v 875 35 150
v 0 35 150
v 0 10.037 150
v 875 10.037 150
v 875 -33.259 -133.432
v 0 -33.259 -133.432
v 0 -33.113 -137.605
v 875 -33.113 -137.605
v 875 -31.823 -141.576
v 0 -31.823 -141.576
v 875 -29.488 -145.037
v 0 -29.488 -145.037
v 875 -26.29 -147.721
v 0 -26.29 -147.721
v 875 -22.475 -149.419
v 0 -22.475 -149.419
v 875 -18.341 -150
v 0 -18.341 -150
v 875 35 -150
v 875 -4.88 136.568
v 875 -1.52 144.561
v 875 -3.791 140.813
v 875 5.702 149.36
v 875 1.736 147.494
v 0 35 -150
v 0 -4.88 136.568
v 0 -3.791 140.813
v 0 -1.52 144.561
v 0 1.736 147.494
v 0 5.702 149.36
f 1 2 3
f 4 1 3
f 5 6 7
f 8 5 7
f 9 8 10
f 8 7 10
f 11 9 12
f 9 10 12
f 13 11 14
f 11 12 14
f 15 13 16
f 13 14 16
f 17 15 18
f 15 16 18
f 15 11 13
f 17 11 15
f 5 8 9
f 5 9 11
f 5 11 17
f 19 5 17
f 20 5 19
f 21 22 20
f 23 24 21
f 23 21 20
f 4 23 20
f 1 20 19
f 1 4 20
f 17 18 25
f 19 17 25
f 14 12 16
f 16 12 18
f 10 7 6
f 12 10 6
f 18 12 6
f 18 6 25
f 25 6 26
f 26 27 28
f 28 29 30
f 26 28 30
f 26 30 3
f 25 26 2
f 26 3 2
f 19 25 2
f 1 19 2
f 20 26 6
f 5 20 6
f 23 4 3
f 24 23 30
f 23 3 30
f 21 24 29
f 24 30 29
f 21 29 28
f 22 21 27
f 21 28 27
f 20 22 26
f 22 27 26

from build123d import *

# Parameters (mm, degrees)
F1_DEPTH = 875


with BuildPart() as f1:
    # F0 (on Right) → F1 (new body)
    with BuildSketch(Plane.YZ):
        with BuildLine():
            Line((35, 150), (10.037331, 150))
            ThreePointArc((10.037331, 150), (0.000372, 146.147172), (-4.880497, 136.567927))
            Line((-4.880497, 136.567927), (-33.258641, -133.432073))
            ThreePointArc((-33.258641, -133.432073), (-29.487985, -145.036959), (-18.340812, -150))
            Line((-18.340812, -150), (35, -150))
            Line((35, -150), (35, 150))
        make_face()
    extrude(amount=F1_DEPTH)


solid = f1.part
